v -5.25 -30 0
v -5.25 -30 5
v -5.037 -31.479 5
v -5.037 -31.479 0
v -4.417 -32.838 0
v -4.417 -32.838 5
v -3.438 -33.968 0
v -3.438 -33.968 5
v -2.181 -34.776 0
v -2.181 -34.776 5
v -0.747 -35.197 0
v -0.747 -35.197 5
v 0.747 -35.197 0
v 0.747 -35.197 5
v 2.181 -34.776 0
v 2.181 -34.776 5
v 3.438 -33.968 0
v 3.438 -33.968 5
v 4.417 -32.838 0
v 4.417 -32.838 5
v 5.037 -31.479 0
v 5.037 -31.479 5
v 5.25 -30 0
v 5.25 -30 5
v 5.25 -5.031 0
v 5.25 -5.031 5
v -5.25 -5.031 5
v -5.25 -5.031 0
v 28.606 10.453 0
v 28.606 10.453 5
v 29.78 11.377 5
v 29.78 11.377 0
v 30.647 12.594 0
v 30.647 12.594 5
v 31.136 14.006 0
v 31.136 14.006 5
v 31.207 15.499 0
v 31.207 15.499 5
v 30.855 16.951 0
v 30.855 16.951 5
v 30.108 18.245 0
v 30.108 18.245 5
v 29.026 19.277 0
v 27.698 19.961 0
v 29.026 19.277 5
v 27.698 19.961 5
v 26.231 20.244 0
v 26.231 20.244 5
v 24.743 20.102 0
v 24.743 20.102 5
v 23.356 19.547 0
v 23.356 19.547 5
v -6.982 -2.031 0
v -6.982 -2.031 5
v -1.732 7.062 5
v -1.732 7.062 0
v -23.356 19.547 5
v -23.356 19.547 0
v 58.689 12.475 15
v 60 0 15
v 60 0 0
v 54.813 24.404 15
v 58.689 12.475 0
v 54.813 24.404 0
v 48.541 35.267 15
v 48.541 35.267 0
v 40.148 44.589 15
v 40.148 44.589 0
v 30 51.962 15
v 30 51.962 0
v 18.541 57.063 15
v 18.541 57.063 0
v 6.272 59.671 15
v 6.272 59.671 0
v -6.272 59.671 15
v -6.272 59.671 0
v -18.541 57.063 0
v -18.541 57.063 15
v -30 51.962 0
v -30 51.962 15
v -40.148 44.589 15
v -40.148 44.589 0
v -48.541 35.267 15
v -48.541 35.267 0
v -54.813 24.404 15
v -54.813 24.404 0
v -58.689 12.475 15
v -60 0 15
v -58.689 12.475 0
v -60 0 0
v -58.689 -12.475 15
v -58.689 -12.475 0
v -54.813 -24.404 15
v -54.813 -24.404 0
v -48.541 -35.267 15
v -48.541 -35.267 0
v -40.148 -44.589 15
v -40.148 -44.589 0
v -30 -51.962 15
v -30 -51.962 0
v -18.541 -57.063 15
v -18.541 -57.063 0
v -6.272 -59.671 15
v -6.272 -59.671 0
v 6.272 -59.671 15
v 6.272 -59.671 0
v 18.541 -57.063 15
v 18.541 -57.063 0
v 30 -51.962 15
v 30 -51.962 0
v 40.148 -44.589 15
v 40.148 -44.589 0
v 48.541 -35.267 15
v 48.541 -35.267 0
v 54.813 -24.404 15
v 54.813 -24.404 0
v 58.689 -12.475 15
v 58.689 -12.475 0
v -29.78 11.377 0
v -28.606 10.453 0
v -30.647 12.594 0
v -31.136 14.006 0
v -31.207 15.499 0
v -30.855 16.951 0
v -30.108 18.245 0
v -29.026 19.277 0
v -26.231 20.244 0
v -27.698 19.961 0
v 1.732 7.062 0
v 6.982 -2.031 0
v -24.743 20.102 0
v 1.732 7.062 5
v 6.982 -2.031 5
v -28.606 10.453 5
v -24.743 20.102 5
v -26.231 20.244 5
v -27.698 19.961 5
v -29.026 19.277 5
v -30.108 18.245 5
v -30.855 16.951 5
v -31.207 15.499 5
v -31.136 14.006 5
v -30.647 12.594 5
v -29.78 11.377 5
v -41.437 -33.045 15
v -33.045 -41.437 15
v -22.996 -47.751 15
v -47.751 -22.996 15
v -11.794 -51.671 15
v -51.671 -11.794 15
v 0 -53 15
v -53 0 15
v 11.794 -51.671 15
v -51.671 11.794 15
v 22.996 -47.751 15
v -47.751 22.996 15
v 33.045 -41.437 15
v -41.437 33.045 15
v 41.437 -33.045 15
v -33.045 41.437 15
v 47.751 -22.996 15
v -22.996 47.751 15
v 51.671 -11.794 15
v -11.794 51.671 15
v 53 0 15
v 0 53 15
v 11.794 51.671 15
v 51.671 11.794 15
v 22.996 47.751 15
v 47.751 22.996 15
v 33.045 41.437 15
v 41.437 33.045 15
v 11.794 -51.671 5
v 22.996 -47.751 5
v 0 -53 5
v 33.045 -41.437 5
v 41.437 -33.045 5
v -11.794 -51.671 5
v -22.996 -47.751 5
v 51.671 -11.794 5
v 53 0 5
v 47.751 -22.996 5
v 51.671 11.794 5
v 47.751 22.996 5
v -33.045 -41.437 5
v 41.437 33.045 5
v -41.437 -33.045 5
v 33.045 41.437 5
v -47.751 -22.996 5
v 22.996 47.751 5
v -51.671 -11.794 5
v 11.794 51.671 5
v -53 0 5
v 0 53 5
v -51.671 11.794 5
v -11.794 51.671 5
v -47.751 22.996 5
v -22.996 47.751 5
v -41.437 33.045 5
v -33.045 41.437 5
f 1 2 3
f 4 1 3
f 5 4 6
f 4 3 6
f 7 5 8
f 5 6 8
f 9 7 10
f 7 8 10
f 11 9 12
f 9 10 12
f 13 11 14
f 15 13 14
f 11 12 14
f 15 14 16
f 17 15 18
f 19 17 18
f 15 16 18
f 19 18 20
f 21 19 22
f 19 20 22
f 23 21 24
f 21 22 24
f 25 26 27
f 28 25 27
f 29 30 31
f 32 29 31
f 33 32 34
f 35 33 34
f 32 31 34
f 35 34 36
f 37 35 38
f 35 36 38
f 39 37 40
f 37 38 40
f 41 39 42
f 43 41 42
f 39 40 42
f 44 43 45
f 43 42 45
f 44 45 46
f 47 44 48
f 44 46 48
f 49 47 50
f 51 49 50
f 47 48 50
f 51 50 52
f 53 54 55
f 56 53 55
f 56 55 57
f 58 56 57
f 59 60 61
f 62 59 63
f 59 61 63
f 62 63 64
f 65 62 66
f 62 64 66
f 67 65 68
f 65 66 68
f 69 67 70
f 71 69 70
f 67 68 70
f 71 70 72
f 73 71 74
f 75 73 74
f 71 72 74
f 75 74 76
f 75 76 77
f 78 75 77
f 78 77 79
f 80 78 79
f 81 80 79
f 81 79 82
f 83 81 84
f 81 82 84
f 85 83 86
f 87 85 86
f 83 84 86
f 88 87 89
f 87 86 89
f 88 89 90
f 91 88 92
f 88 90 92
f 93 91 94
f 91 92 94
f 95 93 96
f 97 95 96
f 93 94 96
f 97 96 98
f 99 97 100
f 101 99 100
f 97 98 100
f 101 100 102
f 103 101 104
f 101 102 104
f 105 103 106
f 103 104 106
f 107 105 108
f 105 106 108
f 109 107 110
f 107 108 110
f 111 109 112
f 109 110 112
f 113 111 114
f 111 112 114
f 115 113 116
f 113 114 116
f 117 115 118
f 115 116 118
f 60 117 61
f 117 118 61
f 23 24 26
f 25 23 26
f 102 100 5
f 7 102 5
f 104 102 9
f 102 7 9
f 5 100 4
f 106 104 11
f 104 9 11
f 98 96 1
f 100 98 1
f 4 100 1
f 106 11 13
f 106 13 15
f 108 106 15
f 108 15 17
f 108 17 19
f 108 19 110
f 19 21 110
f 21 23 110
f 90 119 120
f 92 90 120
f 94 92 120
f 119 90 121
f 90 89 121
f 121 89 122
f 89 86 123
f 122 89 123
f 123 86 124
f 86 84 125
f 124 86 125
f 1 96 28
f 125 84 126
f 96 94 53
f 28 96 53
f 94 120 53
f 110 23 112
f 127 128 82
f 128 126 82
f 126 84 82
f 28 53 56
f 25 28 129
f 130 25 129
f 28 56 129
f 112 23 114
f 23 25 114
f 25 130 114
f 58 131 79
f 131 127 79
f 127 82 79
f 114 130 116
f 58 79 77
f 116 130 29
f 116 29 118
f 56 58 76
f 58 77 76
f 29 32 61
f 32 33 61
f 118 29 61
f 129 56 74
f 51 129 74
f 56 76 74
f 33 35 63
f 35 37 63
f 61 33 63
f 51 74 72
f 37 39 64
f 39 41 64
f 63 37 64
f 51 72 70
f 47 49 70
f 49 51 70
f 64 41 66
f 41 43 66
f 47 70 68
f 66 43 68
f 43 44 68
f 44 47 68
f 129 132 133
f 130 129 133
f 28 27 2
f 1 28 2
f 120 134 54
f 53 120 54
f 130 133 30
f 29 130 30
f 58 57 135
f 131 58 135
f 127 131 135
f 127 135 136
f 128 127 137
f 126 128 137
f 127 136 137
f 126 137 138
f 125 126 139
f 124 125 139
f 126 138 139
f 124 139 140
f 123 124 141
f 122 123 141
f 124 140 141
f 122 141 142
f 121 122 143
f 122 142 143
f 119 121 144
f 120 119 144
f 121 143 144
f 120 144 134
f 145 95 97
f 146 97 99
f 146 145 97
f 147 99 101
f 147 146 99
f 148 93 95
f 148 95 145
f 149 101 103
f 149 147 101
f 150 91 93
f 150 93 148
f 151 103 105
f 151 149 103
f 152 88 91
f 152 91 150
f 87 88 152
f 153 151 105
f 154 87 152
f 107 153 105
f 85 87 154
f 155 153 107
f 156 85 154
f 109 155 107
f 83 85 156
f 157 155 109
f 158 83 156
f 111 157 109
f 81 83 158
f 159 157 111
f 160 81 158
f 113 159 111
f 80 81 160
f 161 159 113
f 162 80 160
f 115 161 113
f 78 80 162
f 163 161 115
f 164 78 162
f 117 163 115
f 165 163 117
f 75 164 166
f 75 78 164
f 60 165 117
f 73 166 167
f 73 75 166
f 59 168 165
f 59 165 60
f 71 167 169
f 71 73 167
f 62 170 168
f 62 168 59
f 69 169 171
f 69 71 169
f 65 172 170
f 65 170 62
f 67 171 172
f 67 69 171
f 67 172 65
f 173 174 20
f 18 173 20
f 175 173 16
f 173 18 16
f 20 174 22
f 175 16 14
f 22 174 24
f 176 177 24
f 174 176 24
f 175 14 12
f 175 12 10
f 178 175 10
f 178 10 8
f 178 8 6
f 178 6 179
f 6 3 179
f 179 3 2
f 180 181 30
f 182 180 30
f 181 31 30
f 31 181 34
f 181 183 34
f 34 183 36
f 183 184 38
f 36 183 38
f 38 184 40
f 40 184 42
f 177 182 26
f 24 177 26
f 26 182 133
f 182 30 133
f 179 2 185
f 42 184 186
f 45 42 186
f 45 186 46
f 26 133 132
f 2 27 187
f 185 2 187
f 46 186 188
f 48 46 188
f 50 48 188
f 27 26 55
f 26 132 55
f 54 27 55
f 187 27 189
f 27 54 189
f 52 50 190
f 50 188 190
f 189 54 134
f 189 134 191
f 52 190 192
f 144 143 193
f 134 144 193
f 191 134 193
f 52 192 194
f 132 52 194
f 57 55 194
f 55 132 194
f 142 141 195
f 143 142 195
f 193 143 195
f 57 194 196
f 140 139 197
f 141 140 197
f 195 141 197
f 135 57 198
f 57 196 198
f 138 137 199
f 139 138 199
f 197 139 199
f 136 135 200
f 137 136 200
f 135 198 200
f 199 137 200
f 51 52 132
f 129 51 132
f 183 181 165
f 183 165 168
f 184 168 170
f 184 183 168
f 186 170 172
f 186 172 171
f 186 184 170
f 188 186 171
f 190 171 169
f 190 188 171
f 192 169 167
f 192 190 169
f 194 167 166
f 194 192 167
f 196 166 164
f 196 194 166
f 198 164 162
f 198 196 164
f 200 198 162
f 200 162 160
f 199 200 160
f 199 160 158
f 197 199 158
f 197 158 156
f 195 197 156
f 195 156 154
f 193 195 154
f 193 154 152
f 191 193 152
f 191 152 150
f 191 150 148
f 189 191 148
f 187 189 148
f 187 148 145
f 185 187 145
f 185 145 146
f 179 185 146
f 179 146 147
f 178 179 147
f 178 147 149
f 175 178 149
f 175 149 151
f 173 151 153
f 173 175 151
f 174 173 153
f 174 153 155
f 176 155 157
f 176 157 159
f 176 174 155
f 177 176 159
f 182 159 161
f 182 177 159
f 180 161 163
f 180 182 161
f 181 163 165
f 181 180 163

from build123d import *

# Parameters (mm, degrees)
CROQUIS1_R                   = 55
DISCO_DEPTH                  = 5
CORTAR_EXTRUIR1_DEPTH        = 10
SALIENTE_EXTRUIR1_DEPTH      = 10
SALIENTE_EXTRUIR1_DEPTH_BACK = 5
CROQUIS7_R                   = 60
CROQUIS7_R_2                 = 55
CROQUIS7_R_3                 = 53
SALIENTE_EXTRUIR6_DEPTH      = 5


with BuildPart() as part:
    # Croquis1 → Disco (new body)
    with BuildSketch(Plane.XY):
        Circle(CROQUIS1_R)
    extrude(amount=DISCO_DEPTH)

    # Croquis6 → Cortar-Extruir1 (cut)
    with BuildSketch(Plane.XY.offset(5)):
        with BuildLine():
            Line((-5.25, 0), (-5.25, -30))
            ThreePointArc((-5.25, -30), (0, -35.25), (5.25, -30))
            Line((5.25, -30), (5.25, 0))
            ThreePointArc((5.25, 0), (0, 5.25), (-5.25, 0))
        make_face()
        with BuildLine():
            Line((2.625, 4.54663337), (-23.355762114, 19.54663337))
            ThreePointArc((-23.355762114, 19.54663337), (-30.527395483, 17.625), (-28.605762114, 10.45336663))
            Line((-28.605762114, 10.45336663), (-2.625, -4.54663337))
            ThreePointArc((-2.625, -4.54663337), (4.54663337, -2.625), (2.625, 4.54663337))
        make_face()
        with BuildLine():
            Line((2.625, -4.54663337), (28.605762114, 10.45336663))
            ThreePointArc((28.605762114, 10.45336663), (30.527395483, 17.625), (23.355762114, 19.54663337))
            Line((23.355762114, 19.54663337), (-2.625, 4.54663337))
            ThreePointArc((-2.625, 4.54663337), (-4.54663337, -2.625), (2.625, -4.54663337))
        make_face()
    extrude(amount=-CORTAR_EXTRUIR1_DEPTH, mode=Mode.SUBTRACT)

    # Croquis7 → Saliente-Extruir1 (add, two sides: drawn at the far end of the back side and taken through both)
    # profile 1 of 2: a face of its own
    with BuildSketch(Plane.XY.offset(5).offset(-SALIENTE_EXTRUIR1_DEPTH_BACK)):
        Circle(CROQUIS7_R)
        Circle(CROQUIS7_R_2, mode=Mode.SUBTRACT)
    # profile 2 of 2: a face of its own
    with BuildSketch(Plane.XY.offset(5).offset(-SALIENTE_EXTRUIR1_DEPTH_BACK)):
        Circle(CROQUIS7_R_2)
        Circle(CROQUIS7_R_3, mode=Mode.SUBTRACT)
    extrude(amount=SALIENTE_EXTRUIR1_DEPTH + SALIENTE_EXTRUIR1_DEPTH_BACK)

    # Croquis8 → Saliente-Extruir6 (add)
    with BuildSketch(Plane.XY.offset(5)):
        Polygon((-8.714101615, -5.031088913), (0, 10.062177826), (8.714101615, -5.031088913), align=None)
    extrude(amount=-SALIENTE_EXTRUIR6_DEPTH)


solid = part.part
